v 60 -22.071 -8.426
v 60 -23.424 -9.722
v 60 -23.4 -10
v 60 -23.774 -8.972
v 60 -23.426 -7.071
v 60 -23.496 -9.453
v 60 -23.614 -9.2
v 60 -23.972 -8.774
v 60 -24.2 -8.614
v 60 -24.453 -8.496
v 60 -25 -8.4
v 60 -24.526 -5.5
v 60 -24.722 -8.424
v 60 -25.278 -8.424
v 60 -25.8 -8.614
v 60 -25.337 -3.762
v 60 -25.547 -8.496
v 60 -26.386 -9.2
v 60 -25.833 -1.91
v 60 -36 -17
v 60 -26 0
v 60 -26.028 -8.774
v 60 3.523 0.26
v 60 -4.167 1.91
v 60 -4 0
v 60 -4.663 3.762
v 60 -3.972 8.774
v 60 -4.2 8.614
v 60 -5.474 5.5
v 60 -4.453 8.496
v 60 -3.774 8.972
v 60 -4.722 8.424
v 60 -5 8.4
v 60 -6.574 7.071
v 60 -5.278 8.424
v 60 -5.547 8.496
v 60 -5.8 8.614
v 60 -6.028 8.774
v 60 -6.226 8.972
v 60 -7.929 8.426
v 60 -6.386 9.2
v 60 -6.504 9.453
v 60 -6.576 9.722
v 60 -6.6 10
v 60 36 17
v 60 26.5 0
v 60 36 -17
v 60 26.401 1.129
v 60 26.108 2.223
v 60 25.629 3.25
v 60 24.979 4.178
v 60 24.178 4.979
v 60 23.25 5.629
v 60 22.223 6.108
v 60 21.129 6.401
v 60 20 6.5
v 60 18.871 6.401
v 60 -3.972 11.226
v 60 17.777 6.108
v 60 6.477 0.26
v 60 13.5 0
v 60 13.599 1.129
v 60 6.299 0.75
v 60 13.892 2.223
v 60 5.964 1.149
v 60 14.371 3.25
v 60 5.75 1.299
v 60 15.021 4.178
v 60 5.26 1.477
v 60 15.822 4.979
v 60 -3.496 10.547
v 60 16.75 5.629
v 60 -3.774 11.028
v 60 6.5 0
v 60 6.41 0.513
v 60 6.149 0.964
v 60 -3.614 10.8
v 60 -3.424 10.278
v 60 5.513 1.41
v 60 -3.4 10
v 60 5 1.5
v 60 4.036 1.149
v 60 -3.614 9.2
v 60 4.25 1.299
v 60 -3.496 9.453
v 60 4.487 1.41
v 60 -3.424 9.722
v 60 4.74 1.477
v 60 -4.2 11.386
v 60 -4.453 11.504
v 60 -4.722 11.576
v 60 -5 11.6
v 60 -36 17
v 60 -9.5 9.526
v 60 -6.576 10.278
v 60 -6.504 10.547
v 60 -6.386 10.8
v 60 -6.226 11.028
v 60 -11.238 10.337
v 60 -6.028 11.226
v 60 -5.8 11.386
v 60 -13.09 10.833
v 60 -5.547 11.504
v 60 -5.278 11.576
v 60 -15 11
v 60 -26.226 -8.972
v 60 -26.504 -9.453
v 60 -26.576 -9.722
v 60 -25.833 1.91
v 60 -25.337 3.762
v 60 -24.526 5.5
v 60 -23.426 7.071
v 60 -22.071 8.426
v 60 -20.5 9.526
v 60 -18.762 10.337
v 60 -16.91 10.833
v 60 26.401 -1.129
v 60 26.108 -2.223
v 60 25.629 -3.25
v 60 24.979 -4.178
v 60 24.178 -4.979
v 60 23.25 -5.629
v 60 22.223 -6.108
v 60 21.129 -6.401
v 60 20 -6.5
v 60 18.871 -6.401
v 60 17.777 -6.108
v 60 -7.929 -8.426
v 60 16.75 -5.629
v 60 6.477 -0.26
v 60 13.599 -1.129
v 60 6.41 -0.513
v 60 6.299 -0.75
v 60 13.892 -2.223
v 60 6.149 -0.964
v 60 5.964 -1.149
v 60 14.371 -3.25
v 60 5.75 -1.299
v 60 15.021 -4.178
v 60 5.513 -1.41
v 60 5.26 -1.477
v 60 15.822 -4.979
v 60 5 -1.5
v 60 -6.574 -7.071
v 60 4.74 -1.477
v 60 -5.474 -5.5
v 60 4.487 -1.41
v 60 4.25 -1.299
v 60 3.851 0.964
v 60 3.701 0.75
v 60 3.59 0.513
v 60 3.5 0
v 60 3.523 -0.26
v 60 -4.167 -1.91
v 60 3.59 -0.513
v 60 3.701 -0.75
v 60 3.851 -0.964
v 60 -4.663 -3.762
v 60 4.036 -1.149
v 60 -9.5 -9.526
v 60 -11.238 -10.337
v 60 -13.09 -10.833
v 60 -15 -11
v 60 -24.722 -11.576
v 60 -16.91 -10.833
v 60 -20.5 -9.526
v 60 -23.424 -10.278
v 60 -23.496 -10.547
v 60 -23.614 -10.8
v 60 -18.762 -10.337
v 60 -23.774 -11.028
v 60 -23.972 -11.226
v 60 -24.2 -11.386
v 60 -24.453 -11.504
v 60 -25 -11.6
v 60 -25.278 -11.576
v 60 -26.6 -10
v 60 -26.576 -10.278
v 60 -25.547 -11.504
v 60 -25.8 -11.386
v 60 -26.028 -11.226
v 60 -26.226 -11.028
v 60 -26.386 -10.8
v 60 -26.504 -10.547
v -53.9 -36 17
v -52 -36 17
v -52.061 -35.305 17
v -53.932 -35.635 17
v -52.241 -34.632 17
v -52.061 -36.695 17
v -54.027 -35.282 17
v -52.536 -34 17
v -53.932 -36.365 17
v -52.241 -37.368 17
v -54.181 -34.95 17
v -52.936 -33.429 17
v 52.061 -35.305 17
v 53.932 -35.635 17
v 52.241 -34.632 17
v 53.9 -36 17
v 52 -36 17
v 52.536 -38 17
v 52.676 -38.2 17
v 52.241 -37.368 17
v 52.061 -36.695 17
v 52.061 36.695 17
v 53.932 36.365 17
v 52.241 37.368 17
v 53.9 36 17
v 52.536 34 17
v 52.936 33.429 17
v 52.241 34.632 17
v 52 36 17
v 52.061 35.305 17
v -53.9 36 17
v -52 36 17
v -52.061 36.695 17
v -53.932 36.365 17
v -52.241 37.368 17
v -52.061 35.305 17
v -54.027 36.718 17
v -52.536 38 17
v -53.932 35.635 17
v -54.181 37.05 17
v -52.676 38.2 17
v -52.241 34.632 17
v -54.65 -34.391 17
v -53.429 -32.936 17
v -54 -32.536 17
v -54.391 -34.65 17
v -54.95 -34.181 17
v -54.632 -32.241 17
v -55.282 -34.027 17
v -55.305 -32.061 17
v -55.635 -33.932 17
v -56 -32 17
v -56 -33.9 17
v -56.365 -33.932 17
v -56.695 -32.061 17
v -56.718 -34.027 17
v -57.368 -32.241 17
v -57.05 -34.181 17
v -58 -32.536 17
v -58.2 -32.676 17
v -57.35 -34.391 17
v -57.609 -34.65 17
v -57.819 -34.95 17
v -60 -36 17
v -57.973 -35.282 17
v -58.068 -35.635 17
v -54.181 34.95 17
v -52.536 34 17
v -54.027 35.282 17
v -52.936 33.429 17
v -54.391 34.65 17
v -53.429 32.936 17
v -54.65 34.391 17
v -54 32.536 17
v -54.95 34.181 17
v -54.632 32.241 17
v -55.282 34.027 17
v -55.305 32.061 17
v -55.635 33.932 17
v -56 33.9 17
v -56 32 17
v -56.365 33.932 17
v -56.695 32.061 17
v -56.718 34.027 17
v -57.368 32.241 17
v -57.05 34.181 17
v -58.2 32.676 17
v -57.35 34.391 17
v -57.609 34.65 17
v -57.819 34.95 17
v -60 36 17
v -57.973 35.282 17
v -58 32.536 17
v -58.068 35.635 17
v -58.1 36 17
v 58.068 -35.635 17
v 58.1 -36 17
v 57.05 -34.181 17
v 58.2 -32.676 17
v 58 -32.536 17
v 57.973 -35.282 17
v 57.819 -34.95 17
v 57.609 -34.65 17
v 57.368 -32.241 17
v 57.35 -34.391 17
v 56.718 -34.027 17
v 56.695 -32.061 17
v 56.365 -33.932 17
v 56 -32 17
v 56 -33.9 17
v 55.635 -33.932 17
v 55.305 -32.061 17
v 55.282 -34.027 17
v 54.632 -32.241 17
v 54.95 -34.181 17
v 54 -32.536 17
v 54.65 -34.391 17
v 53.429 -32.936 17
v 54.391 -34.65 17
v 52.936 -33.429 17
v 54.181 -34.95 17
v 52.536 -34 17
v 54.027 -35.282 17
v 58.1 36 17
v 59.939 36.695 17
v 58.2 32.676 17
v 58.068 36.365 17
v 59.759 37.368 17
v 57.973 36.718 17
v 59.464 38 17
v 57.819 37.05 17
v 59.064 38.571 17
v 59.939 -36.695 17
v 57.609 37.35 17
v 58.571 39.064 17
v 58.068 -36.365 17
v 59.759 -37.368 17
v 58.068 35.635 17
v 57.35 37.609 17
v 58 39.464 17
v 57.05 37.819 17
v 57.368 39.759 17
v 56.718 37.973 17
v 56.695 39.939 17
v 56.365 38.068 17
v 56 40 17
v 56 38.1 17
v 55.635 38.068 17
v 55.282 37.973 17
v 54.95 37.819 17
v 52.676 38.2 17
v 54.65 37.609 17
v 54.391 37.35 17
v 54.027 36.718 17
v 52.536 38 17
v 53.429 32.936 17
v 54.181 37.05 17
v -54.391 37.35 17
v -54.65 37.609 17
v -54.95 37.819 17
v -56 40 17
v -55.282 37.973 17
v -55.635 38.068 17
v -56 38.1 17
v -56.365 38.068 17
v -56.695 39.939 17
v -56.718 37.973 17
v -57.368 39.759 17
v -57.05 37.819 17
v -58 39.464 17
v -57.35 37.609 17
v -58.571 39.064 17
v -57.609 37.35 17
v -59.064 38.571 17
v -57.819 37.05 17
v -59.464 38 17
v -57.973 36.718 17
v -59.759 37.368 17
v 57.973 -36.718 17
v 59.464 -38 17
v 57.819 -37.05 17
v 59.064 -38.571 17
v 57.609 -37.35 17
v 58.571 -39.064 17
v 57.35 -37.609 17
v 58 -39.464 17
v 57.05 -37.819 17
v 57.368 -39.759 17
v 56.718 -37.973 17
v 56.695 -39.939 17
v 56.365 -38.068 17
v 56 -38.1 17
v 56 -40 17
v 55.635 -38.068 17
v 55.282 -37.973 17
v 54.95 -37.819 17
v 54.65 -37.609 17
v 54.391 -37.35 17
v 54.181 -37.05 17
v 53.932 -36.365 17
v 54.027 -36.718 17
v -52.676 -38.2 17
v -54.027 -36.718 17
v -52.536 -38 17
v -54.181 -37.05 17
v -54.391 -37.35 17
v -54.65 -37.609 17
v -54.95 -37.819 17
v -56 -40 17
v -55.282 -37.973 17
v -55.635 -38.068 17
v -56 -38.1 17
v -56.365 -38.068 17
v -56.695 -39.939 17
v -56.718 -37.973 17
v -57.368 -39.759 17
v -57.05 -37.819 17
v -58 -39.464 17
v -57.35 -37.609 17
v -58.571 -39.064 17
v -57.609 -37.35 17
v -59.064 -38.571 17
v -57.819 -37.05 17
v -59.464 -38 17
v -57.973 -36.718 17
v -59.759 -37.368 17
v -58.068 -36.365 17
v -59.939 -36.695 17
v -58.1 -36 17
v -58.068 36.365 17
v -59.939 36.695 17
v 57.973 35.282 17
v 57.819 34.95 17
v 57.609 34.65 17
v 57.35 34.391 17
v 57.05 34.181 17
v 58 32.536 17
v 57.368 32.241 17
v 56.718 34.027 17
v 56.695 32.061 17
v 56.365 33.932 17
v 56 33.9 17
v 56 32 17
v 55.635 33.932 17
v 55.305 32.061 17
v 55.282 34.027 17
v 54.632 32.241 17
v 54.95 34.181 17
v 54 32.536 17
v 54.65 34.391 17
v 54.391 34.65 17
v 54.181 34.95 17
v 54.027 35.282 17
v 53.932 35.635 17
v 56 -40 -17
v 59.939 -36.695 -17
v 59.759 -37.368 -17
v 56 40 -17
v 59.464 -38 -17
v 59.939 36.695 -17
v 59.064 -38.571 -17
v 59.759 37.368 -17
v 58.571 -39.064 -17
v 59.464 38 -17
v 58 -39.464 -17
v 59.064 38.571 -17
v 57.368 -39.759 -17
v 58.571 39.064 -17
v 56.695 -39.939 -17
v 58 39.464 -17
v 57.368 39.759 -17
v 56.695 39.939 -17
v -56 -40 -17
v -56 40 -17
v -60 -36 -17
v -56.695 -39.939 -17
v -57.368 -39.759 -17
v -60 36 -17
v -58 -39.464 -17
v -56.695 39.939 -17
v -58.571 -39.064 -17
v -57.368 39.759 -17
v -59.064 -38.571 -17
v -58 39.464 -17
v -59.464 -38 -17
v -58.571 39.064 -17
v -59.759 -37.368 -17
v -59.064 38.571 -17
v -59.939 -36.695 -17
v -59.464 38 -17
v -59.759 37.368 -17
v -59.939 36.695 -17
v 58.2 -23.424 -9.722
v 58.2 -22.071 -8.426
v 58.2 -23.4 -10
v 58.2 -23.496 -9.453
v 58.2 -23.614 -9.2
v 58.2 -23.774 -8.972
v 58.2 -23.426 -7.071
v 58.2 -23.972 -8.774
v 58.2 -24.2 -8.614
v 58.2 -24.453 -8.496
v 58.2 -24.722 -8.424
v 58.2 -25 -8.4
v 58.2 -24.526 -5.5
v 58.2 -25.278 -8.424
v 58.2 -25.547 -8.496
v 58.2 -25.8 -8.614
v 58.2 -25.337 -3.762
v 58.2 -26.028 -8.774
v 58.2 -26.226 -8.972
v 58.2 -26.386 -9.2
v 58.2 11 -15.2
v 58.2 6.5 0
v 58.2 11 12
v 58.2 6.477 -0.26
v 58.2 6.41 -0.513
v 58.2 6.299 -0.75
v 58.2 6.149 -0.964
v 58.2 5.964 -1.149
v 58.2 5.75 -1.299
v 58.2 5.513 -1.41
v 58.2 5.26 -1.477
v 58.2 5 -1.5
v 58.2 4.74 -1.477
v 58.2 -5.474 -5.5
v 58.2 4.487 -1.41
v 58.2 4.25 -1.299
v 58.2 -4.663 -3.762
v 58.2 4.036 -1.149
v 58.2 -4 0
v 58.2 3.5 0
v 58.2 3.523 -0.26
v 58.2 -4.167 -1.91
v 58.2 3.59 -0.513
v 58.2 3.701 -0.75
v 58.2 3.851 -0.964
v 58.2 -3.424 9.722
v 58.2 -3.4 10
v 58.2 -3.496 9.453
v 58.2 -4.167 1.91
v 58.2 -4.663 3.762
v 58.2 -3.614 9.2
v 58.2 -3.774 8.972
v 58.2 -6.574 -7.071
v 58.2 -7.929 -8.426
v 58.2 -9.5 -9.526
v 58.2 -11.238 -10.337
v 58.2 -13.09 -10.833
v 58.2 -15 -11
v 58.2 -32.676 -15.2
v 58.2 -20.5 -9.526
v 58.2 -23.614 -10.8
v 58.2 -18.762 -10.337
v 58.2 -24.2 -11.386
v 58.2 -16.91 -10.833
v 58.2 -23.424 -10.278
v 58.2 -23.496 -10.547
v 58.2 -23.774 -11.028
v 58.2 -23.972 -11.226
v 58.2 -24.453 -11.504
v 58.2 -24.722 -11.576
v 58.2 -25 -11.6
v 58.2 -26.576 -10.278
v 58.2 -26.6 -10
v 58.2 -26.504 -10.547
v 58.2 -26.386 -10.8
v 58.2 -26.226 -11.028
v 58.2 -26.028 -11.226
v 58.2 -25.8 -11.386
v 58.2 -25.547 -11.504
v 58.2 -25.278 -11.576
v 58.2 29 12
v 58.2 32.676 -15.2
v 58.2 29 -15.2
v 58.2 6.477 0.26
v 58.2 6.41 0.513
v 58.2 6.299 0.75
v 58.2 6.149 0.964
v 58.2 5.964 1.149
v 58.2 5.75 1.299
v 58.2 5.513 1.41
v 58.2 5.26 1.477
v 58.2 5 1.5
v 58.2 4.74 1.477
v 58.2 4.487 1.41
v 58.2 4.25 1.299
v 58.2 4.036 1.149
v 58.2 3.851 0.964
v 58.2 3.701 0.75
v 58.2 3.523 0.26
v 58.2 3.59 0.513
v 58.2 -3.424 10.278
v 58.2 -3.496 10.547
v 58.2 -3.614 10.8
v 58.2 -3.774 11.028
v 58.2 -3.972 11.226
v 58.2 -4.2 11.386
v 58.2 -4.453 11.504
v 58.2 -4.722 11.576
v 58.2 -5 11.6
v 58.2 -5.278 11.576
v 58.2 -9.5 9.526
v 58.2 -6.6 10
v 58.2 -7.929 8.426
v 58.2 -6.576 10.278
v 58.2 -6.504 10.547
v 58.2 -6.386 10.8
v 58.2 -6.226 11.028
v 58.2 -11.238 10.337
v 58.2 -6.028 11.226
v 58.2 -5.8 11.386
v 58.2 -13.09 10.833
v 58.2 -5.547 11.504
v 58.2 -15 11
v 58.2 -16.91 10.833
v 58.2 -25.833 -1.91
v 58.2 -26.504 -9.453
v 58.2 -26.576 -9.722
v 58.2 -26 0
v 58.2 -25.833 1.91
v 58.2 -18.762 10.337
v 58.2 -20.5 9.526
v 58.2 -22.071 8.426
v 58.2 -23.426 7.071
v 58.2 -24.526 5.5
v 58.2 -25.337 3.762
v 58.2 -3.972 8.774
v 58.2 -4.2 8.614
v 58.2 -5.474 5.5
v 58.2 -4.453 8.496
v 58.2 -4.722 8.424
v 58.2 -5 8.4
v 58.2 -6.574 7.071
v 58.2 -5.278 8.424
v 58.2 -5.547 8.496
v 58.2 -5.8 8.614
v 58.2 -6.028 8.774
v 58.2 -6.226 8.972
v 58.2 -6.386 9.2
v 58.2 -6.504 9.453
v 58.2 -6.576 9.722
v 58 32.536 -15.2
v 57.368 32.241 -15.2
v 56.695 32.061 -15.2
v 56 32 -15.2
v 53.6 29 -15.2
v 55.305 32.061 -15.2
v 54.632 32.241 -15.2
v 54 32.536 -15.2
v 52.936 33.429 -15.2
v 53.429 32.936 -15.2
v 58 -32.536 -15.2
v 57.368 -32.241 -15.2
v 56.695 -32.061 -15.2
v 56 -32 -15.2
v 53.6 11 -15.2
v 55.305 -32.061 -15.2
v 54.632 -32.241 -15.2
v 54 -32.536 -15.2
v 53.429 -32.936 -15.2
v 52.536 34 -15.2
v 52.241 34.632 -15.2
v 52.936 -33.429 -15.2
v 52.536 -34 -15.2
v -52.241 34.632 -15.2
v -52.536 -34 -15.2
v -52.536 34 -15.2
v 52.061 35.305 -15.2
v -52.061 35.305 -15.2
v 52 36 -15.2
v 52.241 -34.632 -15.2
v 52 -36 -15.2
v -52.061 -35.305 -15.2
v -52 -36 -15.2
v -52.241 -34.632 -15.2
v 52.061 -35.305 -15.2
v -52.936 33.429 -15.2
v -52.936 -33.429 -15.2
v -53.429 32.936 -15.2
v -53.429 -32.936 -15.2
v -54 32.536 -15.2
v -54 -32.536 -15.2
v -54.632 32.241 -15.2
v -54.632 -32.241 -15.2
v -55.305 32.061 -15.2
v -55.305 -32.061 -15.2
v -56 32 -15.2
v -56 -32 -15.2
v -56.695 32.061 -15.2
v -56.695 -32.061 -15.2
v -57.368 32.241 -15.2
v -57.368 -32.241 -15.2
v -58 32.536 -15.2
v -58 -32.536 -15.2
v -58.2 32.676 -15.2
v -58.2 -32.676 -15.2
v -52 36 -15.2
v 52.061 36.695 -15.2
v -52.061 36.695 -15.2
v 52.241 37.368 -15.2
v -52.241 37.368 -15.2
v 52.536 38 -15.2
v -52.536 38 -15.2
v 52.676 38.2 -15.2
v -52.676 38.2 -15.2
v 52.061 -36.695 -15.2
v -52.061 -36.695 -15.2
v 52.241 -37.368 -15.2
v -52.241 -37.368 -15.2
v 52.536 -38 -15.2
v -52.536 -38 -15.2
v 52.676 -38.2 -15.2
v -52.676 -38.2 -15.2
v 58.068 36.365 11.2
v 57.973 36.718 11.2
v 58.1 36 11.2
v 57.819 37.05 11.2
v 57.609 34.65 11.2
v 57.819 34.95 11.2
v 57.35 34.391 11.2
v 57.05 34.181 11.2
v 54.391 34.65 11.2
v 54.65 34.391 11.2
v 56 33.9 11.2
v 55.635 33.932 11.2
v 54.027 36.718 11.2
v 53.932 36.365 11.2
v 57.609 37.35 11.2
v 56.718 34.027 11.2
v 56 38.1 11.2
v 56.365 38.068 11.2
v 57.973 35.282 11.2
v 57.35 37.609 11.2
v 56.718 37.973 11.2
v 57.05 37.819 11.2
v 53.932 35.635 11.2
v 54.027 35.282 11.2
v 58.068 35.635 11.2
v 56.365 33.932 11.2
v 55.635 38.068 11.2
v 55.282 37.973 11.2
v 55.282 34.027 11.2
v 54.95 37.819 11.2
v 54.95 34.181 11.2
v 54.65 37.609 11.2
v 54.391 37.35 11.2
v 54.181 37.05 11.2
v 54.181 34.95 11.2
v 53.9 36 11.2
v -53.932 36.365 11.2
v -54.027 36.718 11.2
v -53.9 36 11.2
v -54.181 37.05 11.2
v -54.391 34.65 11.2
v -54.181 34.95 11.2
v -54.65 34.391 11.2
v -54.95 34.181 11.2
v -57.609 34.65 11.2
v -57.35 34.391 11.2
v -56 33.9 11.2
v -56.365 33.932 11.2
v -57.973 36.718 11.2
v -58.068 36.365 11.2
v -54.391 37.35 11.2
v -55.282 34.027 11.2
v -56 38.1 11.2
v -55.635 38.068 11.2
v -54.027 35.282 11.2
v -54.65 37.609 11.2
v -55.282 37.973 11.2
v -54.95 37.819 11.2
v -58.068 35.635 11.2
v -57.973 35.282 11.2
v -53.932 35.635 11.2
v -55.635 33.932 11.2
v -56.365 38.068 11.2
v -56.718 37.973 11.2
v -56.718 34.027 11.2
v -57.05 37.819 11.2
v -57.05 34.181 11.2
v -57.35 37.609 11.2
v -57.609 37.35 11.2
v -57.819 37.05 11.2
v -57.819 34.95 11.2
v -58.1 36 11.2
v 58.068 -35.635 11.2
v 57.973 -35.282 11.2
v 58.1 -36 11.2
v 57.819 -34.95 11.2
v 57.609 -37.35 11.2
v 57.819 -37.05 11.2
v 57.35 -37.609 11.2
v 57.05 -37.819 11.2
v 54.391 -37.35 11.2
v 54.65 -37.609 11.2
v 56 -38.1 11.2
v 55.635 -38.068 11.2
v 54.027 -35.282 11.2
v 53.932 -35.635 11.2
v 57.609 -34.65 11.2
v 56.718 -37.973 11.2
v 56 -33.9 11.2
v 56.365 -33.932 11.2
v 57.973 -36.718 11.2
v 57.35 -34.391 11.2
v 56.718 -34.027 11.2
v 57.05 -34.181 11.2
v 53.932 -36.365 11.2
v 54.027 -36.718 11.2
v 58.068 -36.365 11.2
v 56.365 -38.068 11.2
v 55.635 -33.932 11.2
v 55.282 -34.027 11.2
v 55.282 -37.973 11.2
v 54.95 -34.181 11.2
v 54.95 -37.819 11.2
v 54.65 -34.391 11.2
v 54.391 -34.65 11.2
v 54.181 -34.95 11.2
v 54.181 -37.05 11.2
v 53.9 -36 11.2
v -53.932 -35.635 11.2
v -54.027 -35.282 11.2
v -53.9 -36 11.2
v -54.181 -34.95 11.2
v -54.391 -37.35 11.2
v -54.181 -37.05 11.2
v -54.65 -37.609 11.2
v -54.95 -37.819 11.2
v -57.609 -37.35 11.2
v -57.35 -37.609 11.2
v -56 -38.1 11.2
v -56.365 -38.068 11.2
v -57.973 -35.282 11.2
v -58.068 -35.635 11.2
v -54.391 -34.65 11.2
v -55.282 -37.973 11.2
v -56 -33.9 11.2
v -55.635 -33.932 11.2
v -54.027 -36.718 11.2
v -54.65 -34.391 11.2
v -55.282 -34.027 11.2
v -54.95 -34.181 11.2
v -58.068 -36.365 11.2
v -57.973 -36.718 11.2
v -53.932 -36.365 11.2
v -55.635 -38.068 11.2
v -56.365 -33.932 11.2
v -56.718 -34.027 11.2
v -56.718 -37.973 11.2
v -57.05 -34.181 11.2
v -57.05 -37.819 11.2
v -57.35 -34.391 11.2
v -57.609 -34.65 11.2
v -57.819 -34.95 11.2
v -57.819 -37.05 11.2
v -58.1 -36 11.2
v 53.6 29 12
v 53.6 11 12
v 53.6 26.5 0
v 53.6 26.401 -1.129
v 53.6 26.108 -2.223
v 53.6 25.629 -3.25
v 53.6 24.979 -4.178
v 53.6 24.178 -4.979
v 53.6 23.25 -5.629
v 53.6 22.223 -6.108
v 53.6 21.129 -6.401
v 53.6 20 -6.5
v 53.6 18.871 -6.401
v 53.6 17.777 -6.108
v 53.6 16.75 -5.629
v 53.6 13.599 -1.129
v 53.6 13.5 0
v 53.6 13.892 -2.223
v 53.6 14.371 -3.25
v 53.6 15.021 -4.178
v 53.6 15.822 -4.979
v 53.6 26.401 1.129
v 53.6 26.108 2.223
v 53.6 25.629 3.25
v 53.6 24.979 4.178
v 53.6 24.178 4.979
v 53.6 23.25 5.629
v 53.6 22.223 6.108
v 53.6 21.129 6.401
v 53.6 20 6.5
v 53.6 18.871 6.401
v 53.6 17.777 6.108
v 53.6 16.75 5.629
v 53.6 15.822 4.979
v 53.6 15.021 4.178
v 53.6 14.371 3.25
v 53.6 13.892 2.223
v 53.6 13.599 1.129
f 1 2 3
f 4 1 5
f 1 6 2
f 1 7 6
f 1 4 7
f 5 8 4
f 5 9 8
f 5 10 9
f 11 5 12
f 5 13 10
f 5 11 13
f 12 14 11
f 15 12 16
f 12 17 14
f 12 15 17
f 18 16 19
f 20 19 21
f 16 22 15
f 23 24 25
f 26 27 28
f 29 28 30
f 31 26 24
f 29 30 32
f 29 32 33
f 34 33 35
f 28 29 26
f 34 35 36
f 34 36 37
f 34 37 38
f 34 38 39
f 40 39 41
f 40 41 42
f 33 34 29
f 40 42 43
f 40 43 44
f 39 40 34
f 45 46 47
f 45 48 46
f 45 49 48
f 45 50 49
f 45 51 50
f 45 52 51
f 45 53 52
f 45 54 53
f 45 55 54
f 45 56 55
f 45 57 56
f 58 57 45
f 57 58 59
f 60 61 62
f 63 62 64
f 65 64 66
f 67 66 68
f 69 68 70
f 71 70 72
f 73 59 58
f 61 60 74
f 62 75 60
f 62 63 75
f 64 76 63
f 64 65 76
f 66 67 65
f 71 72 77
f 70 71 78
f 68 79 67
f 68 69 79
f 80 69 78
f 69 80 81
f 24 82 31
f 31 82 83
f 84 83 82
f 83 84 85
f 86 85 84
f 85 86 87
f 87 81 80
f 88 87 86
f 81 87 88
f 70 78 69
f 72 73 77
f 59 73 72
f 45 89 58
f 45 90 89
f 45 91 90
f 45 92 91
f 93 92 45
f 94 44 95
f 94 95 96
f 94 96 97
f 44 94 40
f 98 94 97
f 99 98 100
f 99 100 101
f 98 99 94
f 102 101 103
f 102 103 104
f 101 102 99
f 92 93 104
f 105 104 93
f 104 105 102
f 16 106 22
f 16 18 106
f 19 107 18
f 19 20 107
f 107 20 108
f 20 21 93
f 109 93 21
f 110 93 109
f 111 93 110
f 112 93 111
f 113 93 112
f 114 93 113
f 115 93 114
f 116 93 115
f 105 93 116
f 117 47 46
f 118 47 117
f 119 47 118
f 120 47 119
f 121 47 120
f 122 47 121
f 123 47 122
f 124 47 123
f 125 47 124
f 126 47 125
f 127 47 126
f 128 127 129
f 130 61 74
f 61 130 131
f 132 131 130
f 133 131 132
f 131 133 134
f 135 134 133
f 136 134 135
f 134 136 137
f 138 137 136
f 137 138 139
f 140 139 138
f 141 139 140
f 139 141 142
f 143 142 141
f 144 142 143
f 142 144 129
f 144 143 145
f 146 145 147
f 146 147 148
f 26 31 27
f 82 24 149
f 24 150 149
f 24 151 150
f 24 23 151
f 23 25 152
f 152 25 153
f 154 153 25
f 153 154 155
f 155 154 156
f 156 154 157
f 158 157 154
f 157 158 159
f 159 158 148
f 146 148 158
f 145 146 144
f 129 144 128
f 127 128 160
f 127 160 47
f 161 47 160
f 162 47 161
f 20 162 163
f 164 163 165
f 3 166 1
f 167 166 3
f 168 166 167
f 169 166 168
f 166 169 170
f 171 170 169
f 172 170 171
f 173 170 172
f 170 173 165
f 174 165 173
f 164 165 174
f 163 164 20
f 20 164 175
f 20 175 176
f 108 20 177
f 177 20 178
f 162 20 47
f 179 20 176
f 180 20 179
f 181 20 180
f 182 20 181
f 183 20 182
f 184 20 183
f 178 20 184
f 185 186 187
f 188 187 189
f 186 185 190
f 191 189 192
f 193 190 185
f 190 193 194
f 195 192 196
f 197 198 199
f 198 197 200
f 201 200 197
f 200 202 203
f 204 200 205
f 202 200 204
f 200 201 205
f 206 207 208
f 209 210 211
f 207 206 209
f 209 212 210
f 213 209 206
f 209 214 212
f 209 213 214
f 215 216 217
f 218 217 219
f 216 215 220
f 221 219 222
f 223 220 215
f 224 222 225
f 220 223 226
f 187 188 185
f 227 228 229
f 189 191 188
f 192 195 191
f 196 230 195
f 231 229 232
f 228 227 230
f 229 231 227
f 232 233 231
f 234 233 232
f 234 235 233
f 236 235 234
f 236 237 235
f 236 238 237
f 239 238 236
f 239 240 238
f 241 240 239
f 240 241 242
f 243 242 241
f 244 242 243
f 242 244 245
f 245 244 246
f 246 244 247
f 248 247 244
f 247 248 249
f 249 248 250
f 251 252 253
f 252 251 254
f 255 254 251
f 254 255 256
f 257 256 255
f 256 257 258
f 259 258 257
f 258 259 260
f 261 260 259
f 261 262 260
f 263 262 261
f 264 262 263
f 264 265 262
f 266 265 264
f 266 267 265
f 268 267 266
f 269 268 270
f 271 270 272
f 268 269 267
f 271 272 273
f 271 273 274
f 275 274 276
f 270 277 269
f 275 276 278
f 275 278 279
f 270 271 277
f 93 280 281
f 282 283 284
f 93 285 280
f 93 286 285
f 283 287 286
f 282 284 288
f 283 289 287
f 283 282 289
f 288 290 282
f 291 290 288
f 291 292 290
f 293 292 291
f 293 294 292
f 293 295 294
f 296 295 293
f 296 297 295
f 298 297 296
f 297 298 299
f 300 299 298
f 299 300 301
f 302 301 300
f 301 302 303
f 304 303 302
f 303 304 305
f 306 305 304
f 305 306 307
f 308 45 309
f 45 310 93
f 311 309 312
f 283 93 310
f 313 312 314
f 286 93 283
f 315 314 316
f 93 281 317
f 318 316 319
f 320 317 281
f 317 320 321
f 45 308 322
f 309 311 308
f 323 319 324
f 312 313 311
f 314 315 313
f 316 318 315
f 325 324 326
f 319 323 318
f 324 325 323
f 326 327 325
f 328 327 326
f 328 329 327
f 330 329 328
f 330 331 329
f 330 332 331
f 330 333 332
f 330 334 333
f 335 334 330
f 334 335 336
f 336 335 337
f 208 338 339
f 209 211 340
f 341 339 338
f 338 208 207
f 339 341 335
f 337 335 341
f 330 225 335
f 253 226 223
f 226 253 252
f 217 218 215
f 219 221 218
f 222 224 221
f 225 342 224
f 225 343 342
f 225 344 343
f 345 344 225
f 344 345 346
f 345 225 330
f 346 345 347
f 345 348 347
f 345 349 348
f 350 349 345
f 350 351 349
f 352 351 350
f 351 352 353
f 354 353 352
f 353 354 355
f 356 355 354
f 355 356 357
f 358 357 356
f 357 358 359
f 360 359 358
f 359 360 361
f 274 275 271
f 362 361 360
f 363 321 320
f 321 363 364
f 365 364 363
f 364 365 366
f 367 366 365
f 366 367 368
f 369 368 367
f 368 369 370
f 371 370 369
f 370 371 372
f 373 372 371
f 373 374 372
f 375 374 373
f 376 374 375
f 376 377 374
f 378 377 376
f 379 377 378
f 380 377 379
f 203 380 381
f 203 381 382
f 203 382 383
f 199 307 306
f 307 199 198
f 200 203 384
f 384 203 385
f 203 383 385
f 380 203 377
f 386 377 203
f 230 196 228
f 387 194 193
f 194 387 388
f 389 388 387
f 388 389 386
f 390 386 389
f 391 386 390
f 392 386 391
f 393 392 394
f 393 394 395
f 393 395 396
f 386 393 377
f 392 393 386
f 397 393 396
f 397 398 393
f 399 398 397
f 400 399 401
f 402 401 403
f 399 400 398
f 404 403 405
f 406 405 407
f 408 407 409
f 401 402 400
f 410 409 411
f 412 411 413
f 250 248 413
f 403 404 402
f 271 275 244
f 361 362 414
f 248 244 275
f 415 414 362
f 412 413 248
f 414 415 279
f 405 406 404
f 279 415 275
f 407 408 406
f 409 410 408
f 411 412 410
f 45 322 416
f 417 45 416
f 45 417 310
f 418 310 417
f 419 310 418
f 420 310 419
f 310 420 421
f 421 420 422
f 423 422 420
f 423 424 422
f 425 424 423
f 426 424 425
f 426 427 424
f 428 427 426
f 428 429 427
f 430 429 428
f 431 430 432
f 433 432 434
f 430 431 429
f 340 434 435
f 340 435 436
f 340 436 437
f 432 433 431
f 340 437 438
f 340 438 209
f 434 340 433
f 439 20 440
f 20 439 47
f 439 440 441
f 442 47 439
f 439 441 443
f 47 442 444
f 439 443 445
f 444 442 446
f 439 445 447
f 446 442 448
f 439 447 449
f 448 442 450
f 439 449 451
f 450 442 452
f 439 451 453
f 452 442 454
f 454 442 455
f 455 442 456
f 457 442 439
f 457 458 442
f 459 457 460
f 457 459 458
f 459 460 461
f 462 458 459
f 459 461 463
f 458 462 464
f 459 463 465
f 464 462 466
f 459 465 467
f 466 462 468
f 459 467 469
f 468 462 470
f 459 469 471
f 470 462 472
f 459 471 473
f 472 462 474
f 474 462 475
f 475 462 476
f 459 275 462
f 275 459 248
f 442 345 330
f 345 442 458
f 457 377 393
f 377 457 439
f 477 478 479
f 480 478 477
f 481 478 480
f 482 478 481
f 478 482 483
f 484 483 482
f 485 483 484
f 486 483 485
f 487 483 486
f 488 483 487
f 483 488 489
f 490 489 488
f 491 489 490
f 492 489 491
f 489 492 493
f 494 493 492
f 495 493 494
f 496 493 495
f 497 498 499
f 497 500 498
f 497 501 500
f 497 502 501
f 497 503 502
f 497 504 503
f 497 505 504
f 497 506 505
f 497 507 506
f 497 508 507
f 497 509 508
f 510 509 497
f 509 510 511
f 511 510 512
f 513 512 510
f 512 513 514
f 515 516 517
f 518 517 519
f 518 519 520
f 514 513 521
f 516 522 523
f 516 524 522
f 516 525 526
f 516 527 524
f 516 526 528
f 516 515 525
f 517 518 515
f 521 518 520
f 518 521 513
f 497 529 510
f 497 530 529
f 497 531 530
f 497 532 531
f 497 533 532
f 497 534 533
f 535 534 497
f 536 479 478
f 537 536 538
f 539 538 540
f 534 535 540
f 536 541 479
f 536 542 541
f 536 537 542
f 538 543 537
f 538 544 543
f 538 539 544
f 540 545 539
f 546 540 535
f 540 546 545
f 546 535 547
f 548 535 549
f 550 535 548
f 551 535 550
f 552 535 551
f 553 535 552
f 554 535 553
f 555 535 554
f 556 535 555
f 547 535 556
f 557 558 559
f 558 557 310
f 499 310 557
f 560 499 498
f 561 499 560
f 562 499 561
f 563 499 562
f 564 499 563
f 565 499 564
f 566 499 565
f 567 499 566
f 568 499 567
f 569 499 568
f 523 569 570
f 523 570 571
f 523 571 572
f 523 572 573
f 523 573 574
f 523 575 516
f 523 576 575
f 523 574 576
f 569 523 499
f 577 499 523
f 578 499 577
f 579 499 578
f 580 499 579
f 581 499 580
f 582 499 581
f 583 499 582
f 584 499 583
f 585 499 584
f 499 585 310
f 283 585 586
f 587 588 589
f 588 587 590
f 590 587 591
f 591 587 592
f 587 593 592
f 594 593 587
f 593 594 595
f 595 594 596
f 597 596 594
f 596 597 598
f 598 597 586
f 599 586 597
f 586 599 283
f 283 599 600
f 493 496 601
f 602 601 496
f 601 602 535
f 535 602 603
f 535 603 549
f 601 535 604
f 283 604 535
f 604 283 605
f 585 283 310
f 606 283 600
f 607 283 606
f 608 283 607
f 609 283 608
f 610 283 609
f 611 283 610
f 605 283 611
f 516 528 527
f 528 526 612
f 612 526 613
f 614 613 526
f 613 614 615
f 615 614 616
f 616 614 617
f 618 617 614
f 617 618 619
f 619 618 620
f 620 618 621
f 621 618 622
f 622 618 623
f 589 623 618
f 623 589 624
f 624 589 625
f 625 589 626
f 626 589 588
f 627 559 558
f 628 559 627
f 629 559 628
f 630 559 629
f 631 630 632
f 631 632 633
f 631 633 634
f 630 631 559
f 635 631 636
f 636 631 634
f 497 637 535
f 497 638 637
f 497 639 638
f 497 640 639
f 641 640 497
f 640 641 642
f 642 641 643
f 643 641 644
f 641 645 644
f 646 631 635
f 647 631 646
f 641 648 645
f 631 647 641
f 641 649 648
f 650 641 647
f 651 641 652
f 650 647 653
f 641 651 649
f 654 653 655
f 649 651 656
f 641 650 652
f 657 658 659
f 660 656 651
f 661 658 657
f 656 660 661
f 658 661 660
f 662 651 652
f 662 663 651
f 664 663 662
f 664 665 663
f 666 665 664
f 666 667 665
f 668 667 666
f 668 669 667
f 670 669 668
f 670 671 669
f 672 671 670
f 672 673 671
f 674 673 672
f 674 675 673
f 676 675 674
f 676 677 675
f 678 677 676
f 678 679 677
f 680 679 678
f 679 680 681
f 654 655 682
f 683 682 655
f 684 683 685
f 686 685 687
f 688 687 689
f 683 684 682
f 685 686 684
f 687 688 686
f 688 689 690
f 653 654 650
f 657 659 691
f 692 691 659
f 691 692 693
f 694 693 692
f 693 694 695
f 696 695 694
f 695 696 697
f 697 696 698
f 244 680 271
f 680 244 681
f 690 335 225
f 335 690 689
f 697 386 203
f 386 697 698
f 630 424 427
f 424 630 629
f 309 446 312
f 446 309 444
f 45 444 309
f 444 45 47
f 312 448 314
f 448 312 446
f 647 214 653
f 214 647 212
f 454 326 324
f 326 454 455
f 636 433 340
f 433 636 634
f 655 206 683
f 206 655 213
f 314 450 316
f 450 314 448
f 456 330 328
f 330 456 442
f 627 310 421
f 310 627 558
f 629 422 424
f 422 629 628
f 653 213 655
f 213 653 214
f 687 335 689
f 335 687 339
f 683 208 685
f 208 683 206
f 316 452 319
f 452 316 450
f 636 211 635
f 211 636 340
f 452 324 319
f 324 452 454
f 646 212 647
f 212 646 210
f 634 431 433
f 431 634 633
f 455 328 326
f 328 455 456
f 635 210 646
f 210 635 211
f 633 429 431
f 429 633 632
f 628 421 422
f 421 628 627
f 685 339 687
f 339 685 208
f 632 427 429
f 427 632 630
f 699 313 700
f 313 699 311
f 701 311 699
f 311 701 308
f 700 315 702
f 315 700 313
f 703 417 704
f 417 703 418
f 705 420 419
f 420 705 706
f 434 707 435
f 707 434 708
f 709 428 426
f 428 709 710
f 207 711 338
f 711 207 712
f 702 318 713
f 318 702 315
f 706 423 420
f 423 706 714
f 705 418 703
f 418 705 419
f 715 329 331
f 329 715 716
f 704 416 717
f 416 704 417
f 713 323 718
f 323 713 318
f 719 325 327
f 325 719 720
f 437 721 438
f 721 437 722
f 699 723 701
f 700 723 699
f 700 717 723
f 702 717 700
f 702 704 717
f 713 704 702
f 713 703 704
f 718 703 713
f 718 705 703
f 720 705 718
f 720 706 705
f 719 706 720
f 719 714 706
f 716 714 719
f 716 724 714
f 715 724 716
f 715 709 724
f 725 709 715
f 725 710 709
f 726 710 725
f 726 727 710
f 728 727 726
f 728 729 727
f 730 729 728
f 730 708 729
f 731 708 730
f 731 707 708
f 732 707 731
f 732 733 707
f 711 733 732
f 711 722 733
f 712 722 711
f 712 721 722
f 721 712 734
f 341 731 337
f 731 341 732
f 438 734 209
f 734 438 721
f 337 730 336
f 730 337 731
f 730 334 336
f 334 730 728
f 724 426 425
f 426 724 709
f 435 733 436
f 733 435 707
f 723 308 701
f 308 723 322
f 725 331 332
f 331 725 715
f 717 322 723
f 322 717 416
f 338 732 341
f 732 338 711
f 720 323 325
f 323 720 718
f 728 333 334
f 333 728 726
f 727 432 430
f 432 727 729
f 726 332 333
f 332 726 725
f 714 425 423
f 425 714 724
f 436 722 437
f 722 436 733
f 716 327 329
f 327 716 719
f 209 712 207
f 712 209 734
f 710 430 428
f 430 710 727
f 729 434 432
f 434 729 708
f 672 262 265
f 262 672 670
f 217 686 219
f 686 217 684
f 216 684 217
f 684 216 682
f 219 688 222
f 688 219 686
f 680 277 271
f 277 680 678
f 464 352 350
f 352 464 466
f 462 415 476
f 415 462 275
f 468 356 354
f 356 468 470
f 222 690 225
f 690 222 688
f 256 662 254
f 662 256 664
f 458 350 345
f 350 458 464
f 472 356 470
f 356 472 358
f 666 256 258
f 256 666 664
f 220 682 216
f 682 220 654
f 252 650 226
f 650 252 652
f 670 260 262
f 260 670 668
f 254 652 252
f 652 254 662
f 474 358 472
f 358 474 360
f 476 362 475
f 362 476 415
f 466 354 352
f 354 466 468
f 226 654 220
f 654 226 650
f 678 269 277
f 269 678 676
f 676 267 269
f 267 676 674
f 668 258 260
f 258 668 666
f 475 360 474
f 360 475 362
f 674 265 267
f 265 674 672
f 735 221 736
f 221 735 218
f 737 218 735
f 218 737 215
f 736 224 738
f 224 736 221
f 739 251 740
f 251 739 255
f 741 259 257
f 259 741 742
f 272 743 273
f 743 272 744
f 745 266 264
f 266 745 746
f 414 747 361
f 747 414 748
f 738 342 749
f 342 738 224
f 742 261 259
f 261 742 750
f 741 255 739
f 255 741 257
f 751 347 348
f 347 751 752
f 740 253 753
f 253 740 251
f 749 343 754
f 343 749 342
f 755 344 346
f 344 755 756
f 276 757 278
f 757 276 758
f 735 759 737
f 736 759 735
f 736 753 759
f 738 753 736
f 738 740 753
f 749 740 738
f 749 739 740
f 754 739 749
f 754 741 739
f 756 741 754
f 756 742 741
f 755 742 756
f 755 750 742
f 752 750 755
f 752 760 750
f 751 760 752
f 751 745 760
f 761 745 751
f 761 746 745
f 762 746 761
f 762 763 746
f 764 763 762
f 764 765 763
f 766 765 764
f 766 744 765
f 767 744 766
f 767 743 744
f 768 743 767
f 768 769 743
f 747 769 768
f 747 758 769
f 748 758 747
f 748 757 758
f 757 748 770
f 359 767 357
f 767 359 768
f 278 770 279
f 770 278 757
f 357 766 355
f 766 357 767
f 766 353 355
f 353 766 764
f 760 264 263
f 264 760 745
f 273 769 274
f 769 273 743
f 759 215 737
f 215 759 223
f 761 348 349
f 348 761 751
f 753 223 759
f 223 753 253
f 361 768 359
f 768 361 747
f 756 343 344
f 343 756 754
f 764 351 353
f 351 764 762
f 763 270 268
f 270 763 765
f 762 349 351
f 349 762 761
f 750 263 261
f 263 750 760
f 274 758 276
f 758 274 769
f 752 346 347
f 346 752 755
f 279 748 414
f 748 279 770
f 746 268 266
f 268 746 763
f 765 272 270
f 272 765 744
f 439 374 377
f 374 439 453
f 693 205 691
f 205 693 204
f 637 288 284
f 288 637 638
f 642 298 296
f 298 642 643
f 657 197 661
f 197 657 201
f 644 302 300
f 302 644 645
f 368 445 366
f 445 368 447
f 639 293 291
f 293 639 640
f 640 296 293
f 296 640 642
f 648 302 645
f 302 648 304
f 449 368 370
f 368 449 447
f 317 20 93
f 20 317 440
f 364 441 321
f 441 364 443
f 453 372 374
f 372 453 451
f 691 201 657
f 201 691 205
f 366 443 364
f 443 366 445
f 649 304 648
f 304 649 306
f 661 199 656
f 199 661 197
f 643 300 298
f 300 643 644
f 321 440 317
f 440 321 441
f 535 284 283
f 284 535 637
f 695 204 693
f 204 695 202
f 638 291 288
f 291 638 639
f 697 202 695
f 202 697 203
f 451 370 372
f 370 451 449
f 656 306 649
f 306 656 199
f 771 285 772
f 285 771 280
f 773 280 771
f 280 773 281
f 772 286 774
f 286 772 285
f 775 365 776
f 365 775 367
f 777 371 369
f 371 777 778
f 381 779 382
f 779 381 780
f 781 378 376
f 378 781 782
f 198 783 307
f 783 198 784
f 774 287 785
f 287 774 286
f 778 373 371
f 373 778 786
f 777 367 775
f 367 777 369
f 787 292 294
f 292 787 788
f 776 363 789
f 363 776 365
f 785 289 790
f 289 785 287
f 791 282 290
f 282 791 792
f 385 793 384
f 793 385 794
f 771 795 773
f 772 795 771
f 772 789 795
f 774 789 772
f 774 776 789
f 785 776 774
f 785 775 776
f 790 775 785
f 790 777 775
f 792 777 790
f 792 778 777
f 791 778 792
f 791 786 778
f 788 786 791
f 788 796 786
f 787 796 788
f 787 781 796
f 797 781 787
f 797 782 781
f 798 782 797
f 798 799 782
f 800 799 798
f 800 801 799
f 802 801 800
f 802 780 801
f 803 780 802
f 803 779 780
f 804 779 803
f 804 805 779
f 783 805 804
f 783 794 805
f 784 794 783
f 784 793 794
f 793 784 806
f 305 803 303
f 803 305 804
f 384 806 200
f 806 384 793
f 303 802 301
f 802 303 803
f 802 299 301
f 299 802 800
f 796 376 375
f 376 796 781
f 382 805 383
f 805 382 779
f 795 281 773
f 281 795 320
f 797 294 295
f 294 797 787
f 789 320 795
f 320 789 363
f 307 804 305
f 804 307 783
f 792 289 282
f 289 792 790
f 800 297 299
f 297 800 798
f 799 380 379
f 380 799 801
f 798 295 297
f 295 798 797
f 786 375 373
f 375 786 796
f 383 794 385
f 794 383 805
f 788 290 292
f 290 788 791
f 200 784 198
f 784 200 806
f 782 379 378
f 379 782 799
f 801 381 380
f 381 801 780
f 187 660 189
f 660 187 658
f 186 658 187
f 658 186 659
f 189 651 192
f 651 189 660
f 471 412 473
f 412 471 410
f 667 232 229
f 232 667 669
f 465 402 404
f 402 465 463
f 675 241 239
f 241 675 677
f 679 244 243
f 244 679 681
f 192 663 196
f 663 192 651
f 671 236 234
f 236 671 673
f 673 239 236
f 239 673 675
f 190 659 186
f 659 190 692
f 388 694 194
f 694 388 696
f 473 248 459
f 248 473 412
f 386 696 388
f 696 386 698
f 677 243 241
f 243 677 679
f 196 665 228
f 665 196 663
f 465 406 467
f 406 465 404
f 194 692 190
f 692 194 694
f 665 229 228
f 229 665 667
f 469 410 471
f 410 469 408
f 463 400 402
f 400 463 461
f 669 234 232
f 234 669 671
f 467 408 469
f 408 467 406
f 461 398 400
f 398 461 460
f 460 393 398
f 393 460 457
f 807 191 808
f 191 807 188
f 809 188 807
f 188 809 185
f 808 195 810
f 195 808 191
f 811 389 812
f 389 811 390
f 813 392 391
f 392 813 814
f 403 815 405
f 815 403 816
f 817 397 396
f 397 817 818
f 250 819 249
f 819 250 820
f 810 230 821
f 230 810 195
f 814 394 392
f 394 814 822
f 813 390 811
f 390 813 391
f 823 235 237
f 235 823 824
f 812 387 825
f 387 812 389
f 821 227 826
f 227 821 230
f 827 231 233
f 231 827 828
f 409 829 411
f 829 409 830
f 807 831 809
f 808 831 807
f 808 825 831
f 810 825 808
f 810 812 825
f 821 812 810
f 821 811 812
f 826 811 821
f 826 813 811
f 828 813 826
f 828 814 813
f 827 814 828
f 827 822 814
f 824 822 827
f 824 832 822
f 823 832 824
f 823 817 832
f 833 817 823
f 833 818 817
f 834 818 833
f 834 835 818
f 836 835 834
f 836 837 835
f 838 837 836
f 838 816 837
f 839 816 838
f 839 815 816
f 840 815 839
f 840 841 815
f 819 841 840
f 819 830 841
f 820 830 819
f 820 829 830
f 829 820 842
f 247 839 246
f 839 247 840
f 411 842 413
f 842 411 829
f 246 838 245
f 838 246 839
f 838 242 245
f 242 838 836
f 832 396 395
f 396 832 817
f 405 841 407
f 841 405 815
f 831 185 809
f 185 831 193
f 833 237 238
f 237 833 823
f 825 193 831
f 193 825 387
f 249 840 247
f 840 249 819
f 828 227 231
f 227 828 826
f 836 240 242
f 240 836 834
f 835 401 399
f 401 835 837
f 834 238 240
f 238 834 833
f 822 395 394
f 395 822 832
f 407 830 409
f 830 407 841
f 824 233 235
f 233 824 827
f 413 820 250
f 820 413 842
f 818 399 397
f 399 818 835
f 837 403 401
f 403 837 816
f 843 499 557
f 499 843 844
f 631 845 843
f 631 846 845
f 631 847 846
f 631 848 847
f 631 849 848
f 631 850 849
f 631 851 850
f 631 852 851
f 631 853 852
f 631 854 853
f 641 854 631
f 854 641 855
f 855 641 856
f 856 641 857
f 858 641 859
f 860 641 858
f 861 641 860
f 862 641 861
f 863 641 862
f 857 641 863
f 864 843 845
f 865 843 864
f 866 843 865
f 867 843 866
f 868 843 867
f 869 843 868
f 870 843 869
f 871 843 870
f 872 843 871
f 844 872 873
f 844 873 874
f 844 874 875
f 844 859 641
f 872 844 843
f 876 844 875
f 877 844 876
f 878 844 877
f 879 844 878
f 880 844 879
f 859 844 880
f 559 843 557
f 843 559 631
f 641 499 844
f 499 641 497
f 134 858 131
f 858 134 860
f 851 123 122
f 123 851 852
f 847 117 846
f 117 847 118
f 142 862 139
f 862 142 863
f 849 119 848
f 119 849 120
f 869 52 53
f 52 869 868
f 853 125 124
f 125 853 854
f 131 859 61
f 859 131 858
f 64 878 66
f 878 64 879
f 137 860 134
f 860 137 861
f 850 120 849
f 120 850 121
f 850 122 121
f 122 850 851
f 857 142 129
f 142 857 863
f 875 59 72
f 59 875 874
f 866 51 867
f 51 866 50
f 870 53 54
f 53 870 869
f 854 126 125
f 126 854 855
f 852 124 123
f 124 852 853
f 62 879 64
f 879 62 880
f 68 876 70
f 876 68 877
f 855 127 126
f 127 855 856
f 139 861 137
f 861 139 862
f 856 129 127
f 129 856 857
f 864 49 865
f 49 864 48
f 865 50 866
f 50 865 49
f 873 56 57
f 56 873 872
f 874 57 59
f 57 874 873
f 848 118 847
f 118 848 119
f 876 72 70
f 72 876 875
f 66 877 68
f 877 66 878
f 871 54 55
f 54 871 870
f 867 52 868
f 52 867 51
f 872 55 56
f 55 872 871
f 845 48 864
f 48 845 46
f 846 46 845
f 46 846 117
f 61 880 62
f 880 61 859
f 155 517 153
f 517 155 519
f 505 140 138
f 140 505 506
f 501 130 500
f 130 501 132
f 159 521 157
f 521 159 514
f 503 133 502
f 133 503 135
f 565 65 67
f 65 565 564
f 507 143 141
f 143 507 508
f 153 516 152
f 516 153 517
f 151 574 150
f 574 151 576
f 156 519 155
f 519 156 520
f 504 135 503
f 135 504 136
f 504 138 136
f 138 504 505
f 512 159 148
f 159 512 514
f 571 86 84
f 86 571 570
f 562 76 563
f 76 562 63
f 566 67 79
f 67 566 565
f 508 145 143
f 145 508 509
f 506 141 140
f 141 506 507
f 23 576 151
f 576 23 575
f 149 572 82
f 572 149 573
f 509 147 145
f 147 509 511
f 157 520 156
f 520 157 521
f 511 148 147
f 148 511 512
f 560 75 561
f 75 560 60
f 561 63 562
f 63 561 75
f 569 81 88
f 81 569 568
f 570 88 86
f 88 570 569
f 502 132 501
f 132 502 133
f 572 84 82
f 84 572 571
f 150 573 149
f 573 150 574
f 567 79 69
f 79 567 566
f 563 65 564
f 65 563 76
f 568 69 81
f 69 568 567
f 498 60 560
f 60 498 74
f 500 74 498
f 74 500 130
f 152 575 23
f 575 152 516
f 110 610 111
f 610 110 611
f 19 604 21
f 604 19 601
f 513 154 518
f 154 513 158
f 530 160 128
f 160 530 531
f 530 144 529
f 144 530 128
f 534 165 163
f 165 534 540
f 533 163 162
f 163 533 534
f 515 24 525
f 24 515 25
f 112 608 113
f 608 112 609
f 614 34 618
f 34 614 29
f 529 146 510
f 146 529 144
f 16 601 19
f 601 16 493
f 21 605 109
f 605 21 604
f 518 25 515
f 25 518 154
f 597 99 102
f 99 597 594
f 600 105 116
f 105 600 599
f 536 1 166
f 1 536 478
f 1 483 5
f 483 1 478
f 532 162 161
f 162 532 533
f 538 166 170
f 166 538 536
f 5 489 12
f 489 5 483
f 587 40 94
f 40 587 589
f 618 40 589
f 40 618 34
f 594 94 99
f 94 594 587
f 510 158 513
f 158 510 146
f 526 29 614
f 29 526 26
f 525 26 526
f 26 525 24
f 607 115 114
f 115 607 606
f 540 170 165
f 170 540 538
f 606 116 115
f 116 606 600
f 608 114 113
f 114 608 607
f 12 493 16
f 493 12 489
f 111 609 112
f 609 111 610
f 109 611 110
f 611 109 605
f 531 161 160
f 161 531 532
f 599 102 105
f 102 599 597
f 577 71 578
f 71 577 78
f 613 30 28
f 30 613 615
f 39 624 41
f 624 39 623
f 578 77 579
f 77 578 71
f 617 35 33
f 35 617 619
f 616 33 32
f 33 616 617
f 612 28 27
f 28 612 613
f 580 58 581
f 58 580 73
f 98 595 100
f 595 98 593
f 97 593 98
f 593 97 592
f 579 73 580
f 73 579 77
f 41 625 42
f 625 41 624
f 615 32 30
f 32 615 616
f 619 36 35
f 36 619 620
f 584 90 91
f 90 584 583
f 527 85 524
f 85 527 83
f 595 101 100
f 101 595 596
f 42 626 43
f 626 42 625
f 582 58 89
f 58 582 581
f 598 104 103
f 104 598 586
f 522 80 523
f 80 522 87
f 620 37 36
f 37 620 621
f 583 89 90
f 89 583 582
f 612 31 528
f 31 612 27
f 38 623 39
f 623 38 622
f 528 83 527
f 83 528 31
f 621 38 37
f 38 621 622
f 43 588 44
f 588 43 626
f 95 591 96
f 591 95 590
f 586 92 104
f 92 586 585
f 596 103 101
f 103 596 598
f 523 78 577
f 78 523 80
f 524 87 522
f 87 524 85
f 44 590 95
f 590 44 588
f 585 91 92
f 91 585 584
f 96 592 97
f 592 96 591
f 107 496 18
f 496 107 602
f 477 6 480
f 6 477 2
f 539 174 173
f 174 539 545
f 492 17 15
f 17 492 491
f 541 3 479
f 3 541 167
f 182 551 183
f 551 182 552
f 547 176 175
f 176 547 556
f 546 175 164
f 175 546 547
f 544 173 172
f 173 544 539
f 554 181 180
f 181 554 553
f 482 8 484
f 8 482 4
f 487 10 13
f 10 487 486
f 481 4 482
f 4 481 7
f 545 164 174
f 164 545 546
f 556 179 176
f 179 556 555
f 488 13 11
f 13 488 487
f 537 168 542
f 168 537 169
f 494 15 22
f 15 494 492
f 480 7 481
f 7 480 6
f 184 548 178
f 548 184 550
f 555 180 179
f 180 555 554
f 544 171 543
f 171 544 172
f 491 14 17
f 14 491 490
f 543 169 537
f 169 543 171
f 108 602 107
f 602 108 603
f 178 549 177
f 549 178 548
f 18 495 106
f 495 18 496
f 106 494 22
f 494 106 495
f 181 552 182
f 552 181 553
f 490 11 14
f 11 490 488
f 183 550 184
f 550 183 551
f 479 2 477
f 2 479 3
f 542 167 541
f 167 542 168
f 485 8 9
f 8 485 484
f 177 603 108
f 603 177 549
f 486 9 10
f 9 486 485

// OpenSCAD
// Definition size of housing
// **************************

       // Those settings have to be identical to the cover !!!
width_x      = 120;          // Width of the housing (outer dimension) 
depth_y      = 80;           // depth of the housing (outer dimension)
wall         = 1.8;          // Wall thickness of the box
cornerradius = 4.0;          // Radius of the corners
                             //   This value also defines the posts for stability and
                             //   for the press-in nuts!

       // Those settings are more or less independent from the cover
height_z     = 34;           // Heigth of the lower part. Total height is this value plus
                             //   the height of the cover
plate        = 1.8;          // Thickness of the bottom plain

       //Definition size of press-in nuts
nutdiameter  = 4.2;          // Hole diameter for thermal press-in nut
nutlength    = 5.8;          // Depth of the nut hole


//Definition of circle angular resolution
resol        = 36;

ard_x = 47;
ard_y = 20;
pillarheight=4;
pillardia=5;
holedia=2;


difference () {

// Construction of housing
   union () {
   // Definition of main body
      difference () {
         union () {
            cube ( [width_x, depth_y - (2* cornerradius), height_z], center = true );
            cube ( [width_x - (2* cornerradius), depth_y, height_z], center = true );
         };
         translate ( [0,0, 0.5+plate / 2] ){
            cube ( [width_x - (2* wall), depth_y- (2* wall), height_z - plate +1], center = true ); 
         };
      };
      
      translate ( [width_x/2-wall-2,20,-2] )
            cube ( [5.2, 18, height_z - 6], center = true ); 

      // Construction of four corner cylinders including nut holes
      // 1st quadrant
      translate ( [(width_x / 2) - cornerradius, (depth_y / 2) - cornerradius, 0 ] ) {
         difference () {
            cylinder (h=height_z, r=cornerradius, center = true, $fn = resol);
            translate ( [ 0,0,(height_z / 2)-(nutlength / 2) ] ) {
               cylinder (h = nutlength, r = nutdiameter / 2, center = true, $fn = resol);
            };
         };
      };

      // 2nd quadrant
      translate ( [-(width_x / 2) + cornerradius, (depth_y / 2) - cornerradius, 0] ) {
         difference () {
            cylinder (h=height_z, r=cornerradius, center = true, $fn = resol);
            translate ( [ 0,0,(height_z / 2)-(nutlength / 2) ] ) {
               cylinder (h = nutlength, r = nutdiameter / 2, center = true, $fn = resol);
            };
         };
      };

      // 4th quadrant
      translate ( [(width_x / 2) - cornerradius, -(depth_y / 2) + cornerradius, 0] ) {
         difference () {
            cylinder (h=height_z, r=cornerradius, center = true, $fn = resol);
            translate ( [ 0,0,(height_z / 2)-(nutlength / 2) ] ) {
               cylinder (h = nutlength, r = nutdiameter / 2, center = true, $fn = resol);
            };
         };
      };

      // 3rd quadrant
      translate ( [-(width_x / 2) + cornerradius, -(depth_y / 2) + cornerradius, 0] ) {
         difference () {
            cylinder (h=height_z, r=cornerradius, center = true, $fn = resol);
            translate ( [ 0,0,(height_z / 2)-(nutlength / 2) ] ) {
               cylinder (h = nutlength, r = nutdiameter / 2, center = true, $fn = resol);
            };
         };
      }; 
      
    //arduino pillars  
      /*
      translate ( [ard_x,ard_y,-height_z/2+pillarheight/2+plate] ) {
         difference () {
             cylinder ( h = pillarheight, r = pillardia/2, center = true, $fn = resol );
             cylinder ( h = pillarheight, r = holedia/2, center = true, $fn = resol );
         };
     };      

      translate ( [ard_x-15.2,ard_y-50.8,-height_z/2+pillarheight/2+plate] ) {
         difference () {
             cylinder ( h = pillarheight, r = pillardia/2, center = true, $fn = resol );
             cylinder ( h = pillarheight, r = holedia/2, center = true, $fn = resol );
         };
     };      

      translate ( [ard_x-(15.2+27.9),ard_y-50.8,-height_z/2+pillarheight/2+plate] ) {
         difference () {
             cylinder ( h = pillarheight, r = pillardia/2, center = true, $fn = resol );
             cylinder ( h = pillarheight, r = holedia/2, center = true, $fn = resol );
         };
     };      

      translate ( [ard_x-(15.2+27.9+4.7),ard_y+1.25,-height_z/2+pillarheight/2+plate] ) {
         difference () {
             cylinder ( h = pillarheight, r = pillardia/2, center = true, $fn = resol );
             cylinder ( h = pillarheight, r = holedia/2, center = true, $fn = resol );
         };
     }; */     

    //temp arduino outline to test
    /*  translate ( [ard_x+2.75-53/2,ard_y+15.2-68/2,-height_z/2+pillarheight+plate+1.6/2] ) {
       cube ( [53, 68, 1.6], center = true);
      };*/
   };

// Space for the construction of holes, breakouts, ... 
   //DC jack
   translate ( [width_x/2, 20, 0] ) {
            rotate ([0,90,0]) cylinder ( h = 15, r = 13/2, center = true, $fn = resol );
         };

   //LED
   translate ( [width_x/2, 5, 0] ) {
            rotate ([0,90,0]) cylinder ( h = 15, r = 3/2, center = true, $fn = resol );
         };


   //XLR
   translate ( [width_x/2, -15, 0] ) {
            rotate ([0,90,0]) cylinder ( h = 15, r = 22/2, center = true, $fn = resol );
         };

   translate ( [width_x/2, -15+10, 10] ) {
            rotate ([0,90,0]) cylinder ( h = 15, r = 3.2/2, center = true, $fn = resol );
         };
   
   translate ( [width_x/2, -15-10, -10] ) {
            rotate ([0,90,0]) cylinder ( h = 15, r = 3.2/2, center = true, $fn = resol );
         };


};
